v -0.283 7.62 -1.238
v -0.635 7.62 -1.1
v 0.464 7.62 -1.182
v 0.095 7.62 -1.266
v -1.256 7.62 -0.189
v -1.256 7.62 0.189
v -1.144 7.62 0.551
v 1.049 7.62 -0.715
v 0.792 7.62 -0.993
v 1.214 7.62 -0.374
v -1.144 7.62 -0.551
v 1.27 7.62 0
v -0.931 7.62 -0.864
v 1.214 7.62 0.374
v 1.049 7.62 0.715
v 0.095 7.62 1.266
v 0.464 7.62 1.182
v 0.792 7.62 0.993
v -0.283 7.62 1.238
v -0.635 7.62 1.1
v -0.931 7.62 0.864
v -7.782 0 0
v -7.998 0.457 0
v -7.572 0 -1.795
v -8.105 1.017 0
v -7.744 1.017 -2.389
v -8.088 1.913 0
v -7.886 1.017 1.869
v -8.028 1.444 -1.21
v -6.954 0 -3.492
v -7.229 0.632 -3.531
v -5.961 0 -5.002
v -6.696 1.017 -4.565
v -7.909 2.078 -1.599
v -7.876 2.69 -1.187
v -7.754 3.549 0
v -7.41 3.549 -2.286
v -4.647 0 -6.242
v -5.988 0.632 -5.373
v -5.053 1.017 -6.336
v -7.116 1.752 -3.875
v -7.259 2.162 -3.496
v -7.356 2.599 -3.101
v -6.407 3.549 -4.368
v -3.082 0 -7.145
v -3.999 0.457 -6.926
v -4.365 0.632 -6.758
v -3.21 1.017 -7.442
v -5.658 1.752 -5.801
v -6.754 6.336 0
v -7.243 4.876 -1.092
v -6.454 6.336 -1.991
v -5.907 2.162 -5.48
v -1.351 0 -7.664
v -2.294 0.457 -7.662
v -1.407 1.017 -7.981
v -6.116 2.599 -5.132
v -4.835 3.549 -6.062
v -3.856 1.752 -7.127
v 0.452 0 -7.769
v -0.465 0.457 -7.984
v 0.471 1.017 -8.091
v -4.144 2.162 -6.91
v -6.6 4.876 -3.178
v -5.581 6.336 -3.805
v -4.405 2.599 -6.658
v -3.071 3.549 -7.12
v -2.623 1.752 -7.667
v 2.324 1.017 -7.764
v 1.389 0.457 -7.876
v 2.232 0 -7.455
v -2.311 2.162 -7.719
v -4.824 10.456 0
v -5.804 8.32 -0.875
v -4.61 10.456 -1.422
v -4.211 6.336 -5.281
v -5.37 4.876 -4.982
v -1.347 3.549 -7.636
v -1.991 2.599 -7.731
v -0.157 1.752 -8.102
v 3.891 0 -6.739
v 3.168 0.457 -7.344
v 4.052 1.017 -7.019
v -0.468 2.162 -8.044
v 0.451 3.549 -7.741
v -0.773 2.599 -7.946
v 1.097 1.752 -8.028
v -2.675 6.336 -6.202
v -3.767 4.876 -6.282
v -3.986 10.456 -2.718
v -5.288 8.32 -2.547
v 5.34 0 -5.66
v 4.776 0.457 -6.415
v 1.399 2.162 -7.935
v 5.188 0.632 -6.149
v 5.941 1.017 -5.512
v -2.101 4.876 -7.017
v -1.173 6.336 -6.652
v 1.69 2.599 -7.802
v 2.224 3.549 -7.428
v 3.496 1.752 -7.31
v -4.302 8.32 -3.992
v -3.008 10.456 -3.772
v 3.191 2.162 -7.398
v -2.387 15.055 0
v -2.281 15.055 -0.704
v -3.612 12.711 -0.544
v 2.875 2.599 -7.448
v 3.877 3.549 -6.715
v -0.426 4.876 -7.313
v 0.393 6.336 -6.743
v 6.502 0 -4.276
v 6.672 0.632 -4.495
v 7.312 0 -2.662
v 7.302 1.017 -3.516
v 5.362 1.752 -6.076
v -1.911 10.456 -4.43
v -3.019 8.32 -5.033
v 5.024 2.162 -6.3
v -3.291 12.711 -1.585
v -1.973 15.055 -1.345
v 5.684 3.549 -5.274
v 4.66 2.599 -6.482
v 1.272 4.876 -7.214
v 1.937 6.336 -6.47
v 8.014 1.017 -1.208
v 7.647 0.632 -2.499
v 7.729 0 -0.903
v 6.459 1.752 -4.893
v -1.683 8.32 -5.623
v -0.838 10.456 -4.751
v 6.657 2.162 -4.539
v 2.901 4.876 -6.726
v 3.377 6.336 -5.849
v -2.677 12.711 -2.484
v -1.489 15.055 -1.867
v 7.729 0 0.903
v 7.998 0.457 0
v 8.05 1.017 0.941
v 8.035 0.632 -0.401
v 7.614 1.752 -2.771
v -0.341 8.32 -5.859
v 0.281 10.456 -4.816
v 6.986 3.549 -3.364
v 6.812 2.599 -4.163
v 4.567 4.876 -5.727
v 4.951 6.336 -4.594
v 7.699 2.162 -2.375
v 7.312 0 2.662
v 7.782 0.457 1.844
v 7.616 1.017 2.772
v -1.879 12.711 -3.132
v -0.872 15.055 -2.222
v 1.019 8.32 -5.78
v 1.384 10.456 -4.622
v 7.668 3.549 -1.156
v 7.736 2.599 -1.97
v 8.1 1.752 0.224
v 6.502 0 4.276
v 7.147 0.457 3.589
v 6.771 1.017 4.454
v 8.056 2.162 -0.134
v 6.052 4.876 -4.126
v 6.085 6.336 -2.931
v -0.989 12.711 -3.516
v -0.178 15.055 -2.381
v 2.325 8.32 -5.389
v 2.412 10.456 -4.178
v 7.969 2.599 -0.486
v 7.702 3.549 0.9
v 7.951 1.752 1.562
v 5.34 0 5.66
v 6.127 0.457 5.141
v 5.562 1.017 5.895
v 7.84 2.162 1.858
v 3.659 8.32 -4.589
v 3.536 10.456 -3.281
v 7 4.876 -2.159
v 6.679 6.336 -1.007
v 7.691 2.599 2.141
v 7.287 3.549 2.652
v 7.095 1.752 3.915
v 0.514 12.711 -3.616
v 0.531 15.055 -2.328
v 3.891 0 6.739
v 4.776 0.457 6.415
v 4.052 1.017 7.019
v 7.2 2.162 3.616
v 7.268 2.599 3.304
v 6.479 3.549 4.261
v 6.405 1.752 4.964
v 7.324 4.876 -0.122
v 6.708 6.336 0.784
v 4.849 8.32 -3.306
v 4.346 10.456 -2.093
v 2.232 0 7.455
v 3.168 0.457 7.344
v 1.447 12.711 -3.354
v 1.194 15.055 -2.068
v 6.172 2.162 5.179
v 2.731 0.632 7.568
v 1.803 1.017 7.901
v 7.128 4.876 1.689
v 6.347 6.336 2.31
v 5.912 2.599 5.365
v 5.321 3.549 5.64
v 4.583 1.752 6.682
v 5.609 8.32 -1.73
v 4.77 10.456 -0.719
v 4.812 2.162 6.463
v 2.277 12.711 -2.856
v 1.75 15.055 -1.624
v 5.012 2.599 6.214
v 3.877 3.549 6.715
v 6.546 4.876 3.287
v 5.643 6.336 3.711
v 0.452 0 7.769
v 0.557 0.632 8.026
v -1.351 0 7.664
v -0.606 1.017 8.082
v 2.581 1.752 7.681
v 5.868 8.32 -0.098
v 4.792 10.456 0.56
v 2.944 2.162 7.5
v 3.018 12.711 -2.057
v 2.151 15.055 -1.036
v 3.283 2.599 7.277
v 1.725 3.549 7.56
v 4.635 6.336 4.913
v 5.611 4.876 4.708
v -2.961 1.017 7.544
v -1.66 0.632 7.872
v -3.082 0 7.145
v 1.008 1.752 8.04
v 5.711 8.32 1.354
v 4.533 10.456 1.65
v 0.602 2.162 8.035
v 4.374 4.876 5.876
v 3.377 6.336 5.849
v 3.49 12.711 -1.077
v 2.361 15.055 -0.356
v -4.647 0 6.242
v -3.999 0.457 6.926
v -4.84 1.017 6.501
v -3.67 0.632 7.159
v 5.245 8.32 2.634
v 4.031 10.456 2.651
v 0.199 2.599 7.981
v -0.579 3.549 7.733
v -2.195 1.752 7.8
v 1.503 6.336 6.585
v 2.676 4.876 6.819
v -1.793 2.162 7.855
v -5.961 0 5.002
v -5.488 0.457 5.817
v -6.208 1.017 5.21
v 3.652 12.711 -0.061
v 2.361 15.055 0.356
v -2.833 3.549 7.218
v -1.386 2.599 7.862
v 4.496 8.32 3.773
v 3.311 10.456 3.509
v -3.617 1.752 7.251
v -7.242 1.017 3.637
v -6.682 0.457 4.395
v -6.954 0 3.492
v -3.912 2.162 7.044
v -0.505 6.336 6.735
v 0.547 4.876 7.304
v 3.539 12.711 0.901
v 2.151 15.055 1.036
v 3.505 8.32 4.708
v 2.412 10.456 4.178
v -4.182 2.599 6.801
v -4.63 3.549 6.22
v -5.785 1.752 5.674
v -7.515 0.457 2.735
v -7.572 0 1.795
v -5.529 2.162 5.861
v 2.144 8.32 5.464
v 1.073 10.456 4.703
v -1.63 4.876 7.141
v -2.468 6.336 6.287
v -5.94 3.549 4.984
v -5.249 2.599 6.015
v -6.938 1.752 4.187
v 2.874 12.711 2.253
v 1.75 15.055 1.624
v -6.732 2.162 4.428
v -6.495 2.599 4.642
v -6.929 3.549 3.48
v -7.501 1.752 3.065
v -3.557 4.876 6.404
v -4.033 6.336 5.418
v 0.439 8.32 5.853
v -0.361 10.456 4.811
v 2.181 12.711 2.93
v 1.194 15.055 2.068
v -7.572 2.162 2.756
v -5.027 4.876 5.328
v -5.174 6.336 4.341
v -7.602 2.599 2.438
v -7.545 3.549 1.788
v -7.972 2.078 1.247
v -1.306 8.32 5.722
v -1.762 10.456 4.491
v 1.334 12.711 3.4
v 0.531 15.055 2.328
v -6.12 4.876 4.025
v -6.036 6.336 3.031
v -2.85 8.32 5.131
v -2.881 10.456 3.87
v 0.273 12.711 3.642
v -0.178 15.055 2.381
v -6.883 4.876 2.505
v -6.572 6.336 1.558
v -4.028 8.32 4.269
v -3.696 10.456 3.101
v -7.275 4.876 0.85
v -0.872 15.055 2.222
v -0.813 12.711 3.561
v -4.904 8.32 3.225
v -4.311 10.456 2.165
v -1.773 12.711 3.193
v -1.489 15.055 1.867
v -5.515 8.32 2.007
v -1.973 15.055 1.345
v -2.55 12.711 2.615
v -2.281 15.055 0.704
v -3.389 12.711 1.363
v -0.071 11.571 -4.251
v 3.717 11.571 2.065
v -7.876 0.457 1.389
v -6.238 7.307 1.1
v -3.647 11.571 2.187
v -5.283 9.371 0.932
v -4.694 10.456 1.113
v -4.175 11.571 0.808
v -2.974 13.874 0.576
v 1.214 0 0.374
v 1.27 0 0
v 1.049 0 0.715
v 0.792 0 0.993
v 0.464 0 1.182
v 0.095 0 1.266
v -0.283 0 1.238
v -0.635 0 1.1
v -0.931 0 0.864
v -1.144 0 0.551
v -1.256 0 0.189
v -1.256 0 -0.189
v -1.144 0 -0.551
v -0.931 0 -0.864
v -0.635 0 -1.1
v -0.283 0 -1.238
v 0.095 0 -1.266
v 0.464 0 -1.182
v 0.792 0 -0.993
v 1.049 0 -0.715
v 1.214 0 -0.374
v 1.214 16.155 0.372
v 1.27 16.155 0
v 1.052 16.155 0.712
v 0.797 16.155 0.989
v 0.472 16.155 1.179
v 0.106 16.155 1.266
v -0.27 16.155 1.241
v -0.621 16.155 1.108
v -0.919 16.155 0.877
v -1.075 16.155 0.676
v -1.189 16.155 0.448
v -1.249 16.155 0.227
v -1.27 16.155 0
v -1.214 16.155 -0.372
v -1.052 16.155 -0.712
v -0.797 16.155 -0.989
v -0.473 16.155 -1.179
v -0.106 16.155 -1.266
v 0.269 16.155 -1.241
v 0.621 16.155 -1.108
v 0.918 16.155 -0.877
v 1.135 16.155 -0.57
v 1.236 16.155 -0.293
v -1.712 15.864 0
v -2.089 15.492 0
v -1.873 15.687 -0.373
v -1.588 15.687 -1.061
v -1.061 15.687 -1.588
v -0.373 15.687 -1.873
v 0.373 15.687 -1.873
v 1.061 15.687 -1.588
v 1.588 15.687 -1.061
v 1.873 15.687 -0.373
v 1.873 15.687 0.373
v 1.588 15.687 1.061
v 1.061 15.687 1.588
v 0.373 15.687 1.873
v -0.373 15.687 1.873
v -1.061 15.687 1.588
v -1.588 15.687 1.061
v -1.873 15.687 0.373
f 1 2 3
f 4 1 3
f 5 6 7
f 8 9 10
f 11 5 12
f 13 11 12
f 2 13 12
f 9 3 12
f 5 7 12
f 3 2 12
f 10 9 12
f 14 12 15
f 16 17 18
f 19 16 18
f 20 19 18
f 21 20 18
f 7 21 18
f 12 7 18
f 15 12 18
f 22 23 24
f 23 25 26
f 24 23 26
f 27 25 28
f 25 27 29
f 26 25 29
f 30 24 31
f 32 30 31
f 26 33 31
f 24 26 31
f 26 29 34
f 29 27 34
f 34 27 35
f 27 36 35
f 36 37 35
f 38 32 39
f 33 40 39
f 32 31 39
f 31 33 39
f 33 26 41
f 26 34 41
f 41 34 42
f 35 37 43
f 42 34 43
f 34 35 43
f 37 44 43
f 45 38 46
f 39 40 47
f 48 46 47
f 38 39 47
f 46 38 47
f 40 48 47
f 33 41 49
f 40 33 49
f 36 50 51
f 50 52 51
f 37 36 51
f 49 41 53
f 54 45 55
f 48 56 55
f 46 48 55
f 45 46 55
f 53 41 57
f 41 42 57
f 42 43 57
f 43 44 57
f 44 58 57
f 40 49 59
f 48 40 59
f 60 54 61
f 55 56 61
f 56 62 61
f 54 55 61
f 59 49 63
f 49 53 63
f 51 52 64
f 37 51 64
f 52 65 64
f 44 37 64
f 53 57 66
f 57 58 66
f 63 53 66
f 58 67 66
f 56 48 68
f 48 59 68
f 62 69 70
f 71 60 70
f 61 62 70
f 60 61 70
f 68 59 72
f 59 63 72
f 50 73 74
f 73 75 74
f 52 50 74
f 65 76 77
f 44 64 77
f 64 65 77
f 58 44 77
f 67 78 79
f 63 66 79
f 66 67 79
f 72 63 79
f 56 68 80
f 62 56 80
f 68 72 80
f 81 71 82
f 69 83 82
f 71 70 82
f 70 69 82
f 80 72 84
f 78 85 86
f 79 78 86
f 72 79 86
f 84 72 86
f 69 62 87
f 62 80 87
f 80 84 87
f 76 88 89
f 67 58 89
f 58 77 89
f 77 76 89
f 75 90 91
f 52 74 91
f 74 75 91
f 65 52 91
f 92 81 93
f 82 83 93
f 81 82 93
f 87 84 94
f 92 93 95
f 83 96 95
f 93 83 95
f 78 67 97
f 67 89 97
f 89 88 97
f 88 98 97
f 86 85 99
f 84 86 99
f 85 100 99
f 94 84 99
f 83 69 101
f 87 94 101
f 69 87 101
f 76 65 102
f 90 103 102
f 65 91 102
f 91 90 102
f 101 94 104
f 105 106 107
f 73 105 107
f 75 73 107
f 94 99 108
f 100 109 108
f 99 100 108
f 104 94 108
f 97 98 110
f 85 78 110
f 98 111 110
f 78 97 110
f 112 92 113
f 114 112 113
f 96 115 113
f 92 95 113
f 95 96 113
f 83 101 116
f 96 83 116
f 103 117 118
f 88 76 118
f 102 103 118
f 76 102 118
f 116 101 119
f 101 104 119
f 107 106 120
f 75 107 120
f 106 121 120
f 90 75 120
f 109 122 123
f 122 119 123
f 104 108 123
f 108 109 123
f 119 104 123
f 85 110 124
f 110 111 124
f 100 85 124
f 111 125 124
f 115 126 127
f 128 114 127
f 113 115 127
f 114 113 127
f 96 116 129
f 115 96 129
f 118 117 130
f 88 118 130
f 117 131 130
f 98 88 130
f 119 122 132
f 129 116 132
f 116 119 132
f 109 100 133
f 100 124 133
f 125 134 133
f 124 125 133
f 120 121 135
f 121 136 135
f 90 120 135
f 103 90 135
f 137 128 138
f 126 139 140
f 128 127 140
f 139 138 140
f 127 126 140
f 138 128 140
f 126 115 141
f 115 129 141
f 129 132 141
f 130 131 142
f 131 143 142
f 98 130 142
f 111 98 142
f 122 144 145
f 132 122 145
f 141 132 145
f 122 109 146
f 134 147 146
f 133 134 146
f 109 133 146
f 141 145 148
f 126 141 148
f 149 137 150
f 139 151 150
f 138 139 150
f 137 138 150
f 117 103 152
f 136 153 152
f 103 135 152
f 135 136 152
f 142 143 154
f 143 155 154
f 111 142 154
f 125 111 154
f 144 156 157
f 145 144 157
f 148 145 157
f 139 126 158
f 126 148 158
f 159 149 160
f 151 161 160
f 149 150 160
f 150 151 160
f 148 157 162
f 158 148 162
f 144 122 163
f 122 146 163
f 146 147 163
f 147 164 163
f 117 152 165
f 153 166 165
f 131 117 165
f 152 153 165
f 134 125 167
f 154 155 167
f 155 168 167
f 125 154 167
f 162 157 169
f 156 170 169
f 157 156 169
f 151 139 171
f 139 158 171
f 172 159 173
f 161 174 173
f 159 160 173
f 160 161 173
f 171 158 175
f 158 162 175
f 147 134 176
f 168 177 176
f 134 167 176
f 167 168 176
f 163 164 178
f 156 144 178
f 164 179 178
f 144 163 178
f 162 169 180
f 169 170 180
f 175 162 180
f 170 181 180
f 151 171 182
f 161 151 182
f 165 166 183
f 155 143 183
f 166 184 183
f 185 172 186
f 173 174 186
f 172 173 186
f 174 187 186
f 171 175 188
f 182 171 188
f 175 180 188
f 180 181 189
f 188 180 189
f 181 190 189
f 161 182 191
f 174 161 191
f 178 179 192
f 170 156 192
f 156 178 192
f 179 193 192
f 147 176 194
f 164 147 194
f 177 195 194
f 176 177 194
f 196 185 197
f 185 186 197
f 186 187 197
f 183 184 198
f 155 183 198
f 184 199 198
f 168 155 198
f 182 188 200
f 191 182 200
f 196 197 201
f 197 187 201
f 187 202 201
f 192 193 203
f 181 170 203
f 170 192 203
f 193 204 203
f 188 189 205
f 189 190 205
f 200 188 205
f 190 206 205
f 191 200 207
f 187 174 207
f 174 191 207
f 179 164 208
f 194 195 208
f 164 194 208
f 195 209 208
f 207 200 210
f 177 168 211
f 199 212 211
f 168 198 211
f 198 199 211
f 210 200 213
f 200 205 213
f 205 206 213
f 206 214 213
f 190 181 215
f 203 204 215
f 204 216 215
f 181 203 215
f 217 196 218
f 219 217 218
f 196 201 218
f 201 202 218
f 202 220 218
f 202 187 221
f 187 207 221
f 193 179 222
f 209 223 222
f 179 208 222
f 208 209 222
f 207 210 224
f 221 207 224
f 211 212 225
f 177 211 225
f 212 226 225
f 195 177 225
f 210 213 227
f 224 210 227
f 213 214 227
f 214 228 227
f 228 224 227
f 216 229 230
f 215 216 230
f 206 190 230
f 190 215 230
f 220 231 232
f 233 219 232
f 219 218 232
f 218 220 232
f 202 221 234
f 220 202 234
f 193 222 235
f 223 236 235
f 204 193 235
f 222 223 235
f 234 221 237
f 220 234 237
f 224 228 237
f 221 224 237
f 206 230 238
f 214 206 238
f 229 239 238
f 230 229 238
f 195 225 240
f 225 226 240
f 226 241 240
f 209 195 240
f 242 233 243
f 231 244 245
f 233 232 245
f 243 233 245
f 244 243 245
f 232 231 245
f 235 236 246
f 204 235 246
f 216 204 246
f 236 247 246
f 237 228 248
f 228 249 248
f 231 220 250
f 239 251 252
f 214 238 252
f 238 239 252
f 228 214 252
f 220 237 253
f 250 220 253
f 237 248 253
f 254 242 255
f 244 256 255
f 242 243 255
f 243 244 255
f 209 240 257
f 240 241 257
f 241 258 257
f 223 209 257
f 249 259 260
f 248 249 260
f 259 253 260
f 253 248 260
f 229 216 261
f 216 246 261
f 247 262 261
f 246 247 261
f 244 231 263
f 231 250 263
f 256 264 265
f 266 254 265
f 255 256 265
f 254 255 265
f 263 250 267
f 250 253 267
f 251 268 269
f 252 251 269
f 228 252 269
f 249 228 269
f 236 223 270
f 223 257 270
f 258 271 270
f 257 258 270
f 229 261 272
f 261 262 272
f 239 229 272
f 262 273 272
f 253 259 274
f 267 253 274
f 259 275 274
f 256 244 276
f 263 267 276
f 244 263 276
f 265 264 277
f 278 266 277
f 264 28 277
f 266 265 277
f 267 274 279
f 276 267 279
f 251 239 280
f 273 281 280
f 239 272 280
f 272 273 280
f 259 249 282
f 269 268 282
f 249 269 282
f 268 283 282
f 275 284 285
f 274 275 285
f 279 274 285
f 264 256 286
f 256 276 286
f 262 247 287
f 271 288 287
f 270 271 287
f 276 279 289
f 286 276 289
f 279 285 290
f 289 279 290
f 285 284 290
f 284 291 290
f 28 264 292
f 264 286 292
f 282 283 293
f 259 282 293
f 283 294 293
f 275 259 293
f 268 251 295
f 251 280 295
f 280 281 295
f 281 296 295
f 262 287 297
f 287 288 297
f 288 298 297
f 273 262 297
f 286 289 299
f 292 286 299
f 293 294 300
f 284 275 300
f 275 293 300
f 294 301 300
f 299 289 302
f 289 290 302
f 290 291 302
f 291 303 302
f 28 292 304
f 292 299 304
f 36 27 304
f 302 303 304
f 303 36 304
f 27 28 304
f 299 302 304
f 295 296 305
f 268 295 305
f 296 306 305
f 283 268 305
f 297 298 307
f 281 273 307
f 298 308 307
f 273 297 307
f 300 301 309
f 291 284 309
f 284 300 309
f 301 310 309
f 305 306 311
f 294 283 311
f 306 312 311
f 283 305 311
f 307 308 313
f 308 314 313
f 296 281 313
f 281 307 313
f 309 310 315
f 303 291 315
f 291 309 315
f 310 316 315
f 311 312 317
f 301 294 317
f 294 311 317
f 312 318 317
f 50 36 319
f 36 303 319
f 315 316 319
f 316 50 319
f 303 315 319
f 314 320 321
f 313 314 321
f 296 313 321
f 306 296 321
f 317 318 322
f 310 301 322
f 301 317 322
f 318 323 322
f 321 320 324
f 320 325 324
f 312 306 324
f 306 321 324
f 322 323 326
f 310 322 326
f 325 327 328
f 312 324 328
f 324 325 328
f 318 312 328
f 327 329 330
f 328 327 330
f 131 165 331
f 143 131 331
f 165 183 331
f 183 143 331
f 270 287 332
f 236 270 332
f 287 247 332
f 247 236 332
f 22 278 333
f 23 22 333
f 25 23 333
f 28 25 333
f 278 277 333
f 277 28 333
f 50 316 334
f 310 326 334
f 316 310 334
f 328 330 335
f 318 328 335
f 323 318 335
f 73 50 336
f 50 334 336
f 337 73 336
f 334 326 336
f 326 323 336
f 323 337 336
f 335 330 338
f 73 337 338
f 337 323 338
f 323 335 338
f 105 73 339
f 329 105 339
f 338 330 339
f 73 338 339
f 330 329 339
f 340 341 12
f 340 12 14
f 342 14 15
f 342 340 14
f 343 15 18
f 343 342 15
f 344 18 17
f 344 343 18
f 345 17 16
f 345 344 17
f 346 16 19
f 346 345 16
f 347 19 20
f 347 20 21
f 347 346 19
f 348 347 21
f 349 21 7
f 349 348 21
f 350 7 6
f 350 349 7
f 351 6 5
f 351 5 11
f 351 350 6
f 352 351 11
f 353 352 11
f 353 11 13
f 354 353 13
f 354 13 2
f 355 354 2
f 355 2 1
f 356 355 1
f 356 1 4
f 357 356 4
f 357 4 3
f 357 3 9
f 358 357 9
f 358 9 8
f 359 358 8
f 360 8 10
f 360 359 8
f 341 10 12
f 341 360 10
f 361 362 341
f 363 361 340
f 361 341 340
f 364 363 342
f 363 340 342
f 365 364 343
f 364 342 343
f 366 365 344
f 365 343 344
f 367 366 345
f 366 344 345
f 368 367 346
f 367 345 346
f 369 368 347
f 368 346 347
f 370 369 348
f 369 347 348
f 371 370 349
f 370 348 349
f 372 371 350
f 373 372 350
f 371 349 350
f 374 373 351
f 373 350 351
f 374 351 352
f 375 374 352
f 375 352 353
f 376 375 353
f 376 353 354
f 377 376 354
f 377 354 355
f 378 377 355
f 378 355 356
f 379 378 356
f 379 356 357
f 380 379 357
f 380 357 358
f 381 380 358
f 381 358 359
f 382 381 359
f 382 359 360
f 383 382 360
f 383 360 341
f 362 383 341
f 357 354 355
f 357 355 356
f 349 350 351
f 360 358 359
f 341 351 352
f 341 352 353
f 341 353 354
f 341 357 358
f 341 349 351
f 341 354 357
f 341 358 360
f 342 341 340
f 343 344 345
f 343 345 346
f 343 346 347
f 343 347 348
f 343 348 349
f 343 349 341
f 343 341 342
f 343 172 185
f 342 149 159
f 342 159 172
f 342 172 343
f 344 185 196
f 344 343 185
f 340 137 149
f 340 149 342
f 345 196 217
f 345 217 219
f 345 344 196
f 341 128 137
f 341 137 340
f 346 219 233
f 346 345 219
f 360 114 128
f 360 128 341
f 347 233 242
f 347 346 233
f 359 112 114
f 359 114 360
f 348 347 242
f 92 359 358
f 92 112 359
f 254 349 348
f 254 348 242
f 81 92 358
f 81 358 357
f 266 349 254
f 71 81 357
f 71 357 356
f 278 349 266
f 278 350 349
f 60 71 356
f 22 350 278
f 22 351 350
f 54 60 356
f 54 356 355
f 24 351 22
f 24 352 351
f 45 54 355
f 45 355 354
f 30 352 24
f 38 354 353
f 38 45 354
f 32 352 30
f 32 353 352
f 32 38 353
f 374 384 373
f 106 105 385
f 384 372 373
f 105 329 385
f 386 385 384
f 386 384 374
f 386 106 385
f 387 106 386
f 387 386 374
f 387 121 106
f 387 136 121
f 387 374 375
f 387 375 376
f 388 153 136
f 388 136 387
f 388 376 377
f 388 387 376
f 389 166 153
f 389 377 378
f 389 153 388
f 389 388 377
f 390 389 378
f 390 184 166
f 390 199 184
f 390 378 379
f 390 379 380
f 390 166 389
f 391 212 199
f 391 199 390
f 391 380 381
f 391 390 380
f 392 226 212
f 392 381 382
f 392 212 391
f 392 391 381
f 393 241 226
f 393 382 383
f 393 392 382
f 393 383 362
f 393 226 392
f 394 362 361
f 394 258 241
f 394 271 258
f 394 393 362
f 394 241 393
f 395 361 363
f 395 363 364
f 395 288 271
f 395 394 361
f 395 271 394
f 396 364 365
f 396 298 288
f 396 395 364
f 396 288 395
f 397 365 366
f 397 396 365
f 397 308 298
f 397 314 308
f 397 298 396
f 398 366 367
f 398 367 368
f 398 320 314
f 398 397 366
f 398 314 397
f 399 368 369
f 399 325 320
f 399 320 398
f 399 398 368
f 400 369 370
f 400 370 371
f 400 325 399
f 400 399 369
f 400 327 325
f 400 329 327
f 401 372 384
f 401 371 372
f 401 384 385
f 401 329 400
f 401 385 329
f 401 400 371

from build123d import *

# Parameters (mm, degrees)
F2_R     = 1.27
F3_DEPTH = 16.51
F4_R     = 1.27
F5_DEPTH = 7.62


with BuildPart() as f1:
    # F0 (on Top) → F1 (revolve)
    with BuildSketch(Plane.XY):
        with BuildLine():
            Line((0, 0), (0, 16.4697519217))
            ThreePointArc((0, 16.4697519217), (-1.3876289372, 16.0894012629), (-2.3873814073, 15.0546666642))
            add(Edge.make_bspline(
                [(-7.781725377, 0), (-9.1527554645, 2.0286652571), (-6.1443571696, 8.1885872655), (-2.3873814073, 15.0546666642)],
                knots=[0.3791424537, 0.3791424537, 0.3791424537, 0.3791424537, 0.8938765681, 0.8938765681, 0.8938765681, 0.8938765681], degree=3))
            Line((-7.781725377, 0), (0, 0))
        make_face()
    revolve(axis=Axis((0, 8.2348759608, 0), (0, -1, 0)))

    # F2 (on Front) → F3 (cut)
    with BuildSketch(Plane.XZ):
        Circle(F2_R)
    extrude(amount=-F3_DEPTH, mode=Mode.SUBTRACT)


with BuildPart() as f5:
    # F4 (on face) → F5 (new body)
    with BuildSketch(Plane.XZ):
        Circle(F4_R)
    extrude(amount=-F5_DEPTH)


solid = Compound([f1.part, f5.part])
